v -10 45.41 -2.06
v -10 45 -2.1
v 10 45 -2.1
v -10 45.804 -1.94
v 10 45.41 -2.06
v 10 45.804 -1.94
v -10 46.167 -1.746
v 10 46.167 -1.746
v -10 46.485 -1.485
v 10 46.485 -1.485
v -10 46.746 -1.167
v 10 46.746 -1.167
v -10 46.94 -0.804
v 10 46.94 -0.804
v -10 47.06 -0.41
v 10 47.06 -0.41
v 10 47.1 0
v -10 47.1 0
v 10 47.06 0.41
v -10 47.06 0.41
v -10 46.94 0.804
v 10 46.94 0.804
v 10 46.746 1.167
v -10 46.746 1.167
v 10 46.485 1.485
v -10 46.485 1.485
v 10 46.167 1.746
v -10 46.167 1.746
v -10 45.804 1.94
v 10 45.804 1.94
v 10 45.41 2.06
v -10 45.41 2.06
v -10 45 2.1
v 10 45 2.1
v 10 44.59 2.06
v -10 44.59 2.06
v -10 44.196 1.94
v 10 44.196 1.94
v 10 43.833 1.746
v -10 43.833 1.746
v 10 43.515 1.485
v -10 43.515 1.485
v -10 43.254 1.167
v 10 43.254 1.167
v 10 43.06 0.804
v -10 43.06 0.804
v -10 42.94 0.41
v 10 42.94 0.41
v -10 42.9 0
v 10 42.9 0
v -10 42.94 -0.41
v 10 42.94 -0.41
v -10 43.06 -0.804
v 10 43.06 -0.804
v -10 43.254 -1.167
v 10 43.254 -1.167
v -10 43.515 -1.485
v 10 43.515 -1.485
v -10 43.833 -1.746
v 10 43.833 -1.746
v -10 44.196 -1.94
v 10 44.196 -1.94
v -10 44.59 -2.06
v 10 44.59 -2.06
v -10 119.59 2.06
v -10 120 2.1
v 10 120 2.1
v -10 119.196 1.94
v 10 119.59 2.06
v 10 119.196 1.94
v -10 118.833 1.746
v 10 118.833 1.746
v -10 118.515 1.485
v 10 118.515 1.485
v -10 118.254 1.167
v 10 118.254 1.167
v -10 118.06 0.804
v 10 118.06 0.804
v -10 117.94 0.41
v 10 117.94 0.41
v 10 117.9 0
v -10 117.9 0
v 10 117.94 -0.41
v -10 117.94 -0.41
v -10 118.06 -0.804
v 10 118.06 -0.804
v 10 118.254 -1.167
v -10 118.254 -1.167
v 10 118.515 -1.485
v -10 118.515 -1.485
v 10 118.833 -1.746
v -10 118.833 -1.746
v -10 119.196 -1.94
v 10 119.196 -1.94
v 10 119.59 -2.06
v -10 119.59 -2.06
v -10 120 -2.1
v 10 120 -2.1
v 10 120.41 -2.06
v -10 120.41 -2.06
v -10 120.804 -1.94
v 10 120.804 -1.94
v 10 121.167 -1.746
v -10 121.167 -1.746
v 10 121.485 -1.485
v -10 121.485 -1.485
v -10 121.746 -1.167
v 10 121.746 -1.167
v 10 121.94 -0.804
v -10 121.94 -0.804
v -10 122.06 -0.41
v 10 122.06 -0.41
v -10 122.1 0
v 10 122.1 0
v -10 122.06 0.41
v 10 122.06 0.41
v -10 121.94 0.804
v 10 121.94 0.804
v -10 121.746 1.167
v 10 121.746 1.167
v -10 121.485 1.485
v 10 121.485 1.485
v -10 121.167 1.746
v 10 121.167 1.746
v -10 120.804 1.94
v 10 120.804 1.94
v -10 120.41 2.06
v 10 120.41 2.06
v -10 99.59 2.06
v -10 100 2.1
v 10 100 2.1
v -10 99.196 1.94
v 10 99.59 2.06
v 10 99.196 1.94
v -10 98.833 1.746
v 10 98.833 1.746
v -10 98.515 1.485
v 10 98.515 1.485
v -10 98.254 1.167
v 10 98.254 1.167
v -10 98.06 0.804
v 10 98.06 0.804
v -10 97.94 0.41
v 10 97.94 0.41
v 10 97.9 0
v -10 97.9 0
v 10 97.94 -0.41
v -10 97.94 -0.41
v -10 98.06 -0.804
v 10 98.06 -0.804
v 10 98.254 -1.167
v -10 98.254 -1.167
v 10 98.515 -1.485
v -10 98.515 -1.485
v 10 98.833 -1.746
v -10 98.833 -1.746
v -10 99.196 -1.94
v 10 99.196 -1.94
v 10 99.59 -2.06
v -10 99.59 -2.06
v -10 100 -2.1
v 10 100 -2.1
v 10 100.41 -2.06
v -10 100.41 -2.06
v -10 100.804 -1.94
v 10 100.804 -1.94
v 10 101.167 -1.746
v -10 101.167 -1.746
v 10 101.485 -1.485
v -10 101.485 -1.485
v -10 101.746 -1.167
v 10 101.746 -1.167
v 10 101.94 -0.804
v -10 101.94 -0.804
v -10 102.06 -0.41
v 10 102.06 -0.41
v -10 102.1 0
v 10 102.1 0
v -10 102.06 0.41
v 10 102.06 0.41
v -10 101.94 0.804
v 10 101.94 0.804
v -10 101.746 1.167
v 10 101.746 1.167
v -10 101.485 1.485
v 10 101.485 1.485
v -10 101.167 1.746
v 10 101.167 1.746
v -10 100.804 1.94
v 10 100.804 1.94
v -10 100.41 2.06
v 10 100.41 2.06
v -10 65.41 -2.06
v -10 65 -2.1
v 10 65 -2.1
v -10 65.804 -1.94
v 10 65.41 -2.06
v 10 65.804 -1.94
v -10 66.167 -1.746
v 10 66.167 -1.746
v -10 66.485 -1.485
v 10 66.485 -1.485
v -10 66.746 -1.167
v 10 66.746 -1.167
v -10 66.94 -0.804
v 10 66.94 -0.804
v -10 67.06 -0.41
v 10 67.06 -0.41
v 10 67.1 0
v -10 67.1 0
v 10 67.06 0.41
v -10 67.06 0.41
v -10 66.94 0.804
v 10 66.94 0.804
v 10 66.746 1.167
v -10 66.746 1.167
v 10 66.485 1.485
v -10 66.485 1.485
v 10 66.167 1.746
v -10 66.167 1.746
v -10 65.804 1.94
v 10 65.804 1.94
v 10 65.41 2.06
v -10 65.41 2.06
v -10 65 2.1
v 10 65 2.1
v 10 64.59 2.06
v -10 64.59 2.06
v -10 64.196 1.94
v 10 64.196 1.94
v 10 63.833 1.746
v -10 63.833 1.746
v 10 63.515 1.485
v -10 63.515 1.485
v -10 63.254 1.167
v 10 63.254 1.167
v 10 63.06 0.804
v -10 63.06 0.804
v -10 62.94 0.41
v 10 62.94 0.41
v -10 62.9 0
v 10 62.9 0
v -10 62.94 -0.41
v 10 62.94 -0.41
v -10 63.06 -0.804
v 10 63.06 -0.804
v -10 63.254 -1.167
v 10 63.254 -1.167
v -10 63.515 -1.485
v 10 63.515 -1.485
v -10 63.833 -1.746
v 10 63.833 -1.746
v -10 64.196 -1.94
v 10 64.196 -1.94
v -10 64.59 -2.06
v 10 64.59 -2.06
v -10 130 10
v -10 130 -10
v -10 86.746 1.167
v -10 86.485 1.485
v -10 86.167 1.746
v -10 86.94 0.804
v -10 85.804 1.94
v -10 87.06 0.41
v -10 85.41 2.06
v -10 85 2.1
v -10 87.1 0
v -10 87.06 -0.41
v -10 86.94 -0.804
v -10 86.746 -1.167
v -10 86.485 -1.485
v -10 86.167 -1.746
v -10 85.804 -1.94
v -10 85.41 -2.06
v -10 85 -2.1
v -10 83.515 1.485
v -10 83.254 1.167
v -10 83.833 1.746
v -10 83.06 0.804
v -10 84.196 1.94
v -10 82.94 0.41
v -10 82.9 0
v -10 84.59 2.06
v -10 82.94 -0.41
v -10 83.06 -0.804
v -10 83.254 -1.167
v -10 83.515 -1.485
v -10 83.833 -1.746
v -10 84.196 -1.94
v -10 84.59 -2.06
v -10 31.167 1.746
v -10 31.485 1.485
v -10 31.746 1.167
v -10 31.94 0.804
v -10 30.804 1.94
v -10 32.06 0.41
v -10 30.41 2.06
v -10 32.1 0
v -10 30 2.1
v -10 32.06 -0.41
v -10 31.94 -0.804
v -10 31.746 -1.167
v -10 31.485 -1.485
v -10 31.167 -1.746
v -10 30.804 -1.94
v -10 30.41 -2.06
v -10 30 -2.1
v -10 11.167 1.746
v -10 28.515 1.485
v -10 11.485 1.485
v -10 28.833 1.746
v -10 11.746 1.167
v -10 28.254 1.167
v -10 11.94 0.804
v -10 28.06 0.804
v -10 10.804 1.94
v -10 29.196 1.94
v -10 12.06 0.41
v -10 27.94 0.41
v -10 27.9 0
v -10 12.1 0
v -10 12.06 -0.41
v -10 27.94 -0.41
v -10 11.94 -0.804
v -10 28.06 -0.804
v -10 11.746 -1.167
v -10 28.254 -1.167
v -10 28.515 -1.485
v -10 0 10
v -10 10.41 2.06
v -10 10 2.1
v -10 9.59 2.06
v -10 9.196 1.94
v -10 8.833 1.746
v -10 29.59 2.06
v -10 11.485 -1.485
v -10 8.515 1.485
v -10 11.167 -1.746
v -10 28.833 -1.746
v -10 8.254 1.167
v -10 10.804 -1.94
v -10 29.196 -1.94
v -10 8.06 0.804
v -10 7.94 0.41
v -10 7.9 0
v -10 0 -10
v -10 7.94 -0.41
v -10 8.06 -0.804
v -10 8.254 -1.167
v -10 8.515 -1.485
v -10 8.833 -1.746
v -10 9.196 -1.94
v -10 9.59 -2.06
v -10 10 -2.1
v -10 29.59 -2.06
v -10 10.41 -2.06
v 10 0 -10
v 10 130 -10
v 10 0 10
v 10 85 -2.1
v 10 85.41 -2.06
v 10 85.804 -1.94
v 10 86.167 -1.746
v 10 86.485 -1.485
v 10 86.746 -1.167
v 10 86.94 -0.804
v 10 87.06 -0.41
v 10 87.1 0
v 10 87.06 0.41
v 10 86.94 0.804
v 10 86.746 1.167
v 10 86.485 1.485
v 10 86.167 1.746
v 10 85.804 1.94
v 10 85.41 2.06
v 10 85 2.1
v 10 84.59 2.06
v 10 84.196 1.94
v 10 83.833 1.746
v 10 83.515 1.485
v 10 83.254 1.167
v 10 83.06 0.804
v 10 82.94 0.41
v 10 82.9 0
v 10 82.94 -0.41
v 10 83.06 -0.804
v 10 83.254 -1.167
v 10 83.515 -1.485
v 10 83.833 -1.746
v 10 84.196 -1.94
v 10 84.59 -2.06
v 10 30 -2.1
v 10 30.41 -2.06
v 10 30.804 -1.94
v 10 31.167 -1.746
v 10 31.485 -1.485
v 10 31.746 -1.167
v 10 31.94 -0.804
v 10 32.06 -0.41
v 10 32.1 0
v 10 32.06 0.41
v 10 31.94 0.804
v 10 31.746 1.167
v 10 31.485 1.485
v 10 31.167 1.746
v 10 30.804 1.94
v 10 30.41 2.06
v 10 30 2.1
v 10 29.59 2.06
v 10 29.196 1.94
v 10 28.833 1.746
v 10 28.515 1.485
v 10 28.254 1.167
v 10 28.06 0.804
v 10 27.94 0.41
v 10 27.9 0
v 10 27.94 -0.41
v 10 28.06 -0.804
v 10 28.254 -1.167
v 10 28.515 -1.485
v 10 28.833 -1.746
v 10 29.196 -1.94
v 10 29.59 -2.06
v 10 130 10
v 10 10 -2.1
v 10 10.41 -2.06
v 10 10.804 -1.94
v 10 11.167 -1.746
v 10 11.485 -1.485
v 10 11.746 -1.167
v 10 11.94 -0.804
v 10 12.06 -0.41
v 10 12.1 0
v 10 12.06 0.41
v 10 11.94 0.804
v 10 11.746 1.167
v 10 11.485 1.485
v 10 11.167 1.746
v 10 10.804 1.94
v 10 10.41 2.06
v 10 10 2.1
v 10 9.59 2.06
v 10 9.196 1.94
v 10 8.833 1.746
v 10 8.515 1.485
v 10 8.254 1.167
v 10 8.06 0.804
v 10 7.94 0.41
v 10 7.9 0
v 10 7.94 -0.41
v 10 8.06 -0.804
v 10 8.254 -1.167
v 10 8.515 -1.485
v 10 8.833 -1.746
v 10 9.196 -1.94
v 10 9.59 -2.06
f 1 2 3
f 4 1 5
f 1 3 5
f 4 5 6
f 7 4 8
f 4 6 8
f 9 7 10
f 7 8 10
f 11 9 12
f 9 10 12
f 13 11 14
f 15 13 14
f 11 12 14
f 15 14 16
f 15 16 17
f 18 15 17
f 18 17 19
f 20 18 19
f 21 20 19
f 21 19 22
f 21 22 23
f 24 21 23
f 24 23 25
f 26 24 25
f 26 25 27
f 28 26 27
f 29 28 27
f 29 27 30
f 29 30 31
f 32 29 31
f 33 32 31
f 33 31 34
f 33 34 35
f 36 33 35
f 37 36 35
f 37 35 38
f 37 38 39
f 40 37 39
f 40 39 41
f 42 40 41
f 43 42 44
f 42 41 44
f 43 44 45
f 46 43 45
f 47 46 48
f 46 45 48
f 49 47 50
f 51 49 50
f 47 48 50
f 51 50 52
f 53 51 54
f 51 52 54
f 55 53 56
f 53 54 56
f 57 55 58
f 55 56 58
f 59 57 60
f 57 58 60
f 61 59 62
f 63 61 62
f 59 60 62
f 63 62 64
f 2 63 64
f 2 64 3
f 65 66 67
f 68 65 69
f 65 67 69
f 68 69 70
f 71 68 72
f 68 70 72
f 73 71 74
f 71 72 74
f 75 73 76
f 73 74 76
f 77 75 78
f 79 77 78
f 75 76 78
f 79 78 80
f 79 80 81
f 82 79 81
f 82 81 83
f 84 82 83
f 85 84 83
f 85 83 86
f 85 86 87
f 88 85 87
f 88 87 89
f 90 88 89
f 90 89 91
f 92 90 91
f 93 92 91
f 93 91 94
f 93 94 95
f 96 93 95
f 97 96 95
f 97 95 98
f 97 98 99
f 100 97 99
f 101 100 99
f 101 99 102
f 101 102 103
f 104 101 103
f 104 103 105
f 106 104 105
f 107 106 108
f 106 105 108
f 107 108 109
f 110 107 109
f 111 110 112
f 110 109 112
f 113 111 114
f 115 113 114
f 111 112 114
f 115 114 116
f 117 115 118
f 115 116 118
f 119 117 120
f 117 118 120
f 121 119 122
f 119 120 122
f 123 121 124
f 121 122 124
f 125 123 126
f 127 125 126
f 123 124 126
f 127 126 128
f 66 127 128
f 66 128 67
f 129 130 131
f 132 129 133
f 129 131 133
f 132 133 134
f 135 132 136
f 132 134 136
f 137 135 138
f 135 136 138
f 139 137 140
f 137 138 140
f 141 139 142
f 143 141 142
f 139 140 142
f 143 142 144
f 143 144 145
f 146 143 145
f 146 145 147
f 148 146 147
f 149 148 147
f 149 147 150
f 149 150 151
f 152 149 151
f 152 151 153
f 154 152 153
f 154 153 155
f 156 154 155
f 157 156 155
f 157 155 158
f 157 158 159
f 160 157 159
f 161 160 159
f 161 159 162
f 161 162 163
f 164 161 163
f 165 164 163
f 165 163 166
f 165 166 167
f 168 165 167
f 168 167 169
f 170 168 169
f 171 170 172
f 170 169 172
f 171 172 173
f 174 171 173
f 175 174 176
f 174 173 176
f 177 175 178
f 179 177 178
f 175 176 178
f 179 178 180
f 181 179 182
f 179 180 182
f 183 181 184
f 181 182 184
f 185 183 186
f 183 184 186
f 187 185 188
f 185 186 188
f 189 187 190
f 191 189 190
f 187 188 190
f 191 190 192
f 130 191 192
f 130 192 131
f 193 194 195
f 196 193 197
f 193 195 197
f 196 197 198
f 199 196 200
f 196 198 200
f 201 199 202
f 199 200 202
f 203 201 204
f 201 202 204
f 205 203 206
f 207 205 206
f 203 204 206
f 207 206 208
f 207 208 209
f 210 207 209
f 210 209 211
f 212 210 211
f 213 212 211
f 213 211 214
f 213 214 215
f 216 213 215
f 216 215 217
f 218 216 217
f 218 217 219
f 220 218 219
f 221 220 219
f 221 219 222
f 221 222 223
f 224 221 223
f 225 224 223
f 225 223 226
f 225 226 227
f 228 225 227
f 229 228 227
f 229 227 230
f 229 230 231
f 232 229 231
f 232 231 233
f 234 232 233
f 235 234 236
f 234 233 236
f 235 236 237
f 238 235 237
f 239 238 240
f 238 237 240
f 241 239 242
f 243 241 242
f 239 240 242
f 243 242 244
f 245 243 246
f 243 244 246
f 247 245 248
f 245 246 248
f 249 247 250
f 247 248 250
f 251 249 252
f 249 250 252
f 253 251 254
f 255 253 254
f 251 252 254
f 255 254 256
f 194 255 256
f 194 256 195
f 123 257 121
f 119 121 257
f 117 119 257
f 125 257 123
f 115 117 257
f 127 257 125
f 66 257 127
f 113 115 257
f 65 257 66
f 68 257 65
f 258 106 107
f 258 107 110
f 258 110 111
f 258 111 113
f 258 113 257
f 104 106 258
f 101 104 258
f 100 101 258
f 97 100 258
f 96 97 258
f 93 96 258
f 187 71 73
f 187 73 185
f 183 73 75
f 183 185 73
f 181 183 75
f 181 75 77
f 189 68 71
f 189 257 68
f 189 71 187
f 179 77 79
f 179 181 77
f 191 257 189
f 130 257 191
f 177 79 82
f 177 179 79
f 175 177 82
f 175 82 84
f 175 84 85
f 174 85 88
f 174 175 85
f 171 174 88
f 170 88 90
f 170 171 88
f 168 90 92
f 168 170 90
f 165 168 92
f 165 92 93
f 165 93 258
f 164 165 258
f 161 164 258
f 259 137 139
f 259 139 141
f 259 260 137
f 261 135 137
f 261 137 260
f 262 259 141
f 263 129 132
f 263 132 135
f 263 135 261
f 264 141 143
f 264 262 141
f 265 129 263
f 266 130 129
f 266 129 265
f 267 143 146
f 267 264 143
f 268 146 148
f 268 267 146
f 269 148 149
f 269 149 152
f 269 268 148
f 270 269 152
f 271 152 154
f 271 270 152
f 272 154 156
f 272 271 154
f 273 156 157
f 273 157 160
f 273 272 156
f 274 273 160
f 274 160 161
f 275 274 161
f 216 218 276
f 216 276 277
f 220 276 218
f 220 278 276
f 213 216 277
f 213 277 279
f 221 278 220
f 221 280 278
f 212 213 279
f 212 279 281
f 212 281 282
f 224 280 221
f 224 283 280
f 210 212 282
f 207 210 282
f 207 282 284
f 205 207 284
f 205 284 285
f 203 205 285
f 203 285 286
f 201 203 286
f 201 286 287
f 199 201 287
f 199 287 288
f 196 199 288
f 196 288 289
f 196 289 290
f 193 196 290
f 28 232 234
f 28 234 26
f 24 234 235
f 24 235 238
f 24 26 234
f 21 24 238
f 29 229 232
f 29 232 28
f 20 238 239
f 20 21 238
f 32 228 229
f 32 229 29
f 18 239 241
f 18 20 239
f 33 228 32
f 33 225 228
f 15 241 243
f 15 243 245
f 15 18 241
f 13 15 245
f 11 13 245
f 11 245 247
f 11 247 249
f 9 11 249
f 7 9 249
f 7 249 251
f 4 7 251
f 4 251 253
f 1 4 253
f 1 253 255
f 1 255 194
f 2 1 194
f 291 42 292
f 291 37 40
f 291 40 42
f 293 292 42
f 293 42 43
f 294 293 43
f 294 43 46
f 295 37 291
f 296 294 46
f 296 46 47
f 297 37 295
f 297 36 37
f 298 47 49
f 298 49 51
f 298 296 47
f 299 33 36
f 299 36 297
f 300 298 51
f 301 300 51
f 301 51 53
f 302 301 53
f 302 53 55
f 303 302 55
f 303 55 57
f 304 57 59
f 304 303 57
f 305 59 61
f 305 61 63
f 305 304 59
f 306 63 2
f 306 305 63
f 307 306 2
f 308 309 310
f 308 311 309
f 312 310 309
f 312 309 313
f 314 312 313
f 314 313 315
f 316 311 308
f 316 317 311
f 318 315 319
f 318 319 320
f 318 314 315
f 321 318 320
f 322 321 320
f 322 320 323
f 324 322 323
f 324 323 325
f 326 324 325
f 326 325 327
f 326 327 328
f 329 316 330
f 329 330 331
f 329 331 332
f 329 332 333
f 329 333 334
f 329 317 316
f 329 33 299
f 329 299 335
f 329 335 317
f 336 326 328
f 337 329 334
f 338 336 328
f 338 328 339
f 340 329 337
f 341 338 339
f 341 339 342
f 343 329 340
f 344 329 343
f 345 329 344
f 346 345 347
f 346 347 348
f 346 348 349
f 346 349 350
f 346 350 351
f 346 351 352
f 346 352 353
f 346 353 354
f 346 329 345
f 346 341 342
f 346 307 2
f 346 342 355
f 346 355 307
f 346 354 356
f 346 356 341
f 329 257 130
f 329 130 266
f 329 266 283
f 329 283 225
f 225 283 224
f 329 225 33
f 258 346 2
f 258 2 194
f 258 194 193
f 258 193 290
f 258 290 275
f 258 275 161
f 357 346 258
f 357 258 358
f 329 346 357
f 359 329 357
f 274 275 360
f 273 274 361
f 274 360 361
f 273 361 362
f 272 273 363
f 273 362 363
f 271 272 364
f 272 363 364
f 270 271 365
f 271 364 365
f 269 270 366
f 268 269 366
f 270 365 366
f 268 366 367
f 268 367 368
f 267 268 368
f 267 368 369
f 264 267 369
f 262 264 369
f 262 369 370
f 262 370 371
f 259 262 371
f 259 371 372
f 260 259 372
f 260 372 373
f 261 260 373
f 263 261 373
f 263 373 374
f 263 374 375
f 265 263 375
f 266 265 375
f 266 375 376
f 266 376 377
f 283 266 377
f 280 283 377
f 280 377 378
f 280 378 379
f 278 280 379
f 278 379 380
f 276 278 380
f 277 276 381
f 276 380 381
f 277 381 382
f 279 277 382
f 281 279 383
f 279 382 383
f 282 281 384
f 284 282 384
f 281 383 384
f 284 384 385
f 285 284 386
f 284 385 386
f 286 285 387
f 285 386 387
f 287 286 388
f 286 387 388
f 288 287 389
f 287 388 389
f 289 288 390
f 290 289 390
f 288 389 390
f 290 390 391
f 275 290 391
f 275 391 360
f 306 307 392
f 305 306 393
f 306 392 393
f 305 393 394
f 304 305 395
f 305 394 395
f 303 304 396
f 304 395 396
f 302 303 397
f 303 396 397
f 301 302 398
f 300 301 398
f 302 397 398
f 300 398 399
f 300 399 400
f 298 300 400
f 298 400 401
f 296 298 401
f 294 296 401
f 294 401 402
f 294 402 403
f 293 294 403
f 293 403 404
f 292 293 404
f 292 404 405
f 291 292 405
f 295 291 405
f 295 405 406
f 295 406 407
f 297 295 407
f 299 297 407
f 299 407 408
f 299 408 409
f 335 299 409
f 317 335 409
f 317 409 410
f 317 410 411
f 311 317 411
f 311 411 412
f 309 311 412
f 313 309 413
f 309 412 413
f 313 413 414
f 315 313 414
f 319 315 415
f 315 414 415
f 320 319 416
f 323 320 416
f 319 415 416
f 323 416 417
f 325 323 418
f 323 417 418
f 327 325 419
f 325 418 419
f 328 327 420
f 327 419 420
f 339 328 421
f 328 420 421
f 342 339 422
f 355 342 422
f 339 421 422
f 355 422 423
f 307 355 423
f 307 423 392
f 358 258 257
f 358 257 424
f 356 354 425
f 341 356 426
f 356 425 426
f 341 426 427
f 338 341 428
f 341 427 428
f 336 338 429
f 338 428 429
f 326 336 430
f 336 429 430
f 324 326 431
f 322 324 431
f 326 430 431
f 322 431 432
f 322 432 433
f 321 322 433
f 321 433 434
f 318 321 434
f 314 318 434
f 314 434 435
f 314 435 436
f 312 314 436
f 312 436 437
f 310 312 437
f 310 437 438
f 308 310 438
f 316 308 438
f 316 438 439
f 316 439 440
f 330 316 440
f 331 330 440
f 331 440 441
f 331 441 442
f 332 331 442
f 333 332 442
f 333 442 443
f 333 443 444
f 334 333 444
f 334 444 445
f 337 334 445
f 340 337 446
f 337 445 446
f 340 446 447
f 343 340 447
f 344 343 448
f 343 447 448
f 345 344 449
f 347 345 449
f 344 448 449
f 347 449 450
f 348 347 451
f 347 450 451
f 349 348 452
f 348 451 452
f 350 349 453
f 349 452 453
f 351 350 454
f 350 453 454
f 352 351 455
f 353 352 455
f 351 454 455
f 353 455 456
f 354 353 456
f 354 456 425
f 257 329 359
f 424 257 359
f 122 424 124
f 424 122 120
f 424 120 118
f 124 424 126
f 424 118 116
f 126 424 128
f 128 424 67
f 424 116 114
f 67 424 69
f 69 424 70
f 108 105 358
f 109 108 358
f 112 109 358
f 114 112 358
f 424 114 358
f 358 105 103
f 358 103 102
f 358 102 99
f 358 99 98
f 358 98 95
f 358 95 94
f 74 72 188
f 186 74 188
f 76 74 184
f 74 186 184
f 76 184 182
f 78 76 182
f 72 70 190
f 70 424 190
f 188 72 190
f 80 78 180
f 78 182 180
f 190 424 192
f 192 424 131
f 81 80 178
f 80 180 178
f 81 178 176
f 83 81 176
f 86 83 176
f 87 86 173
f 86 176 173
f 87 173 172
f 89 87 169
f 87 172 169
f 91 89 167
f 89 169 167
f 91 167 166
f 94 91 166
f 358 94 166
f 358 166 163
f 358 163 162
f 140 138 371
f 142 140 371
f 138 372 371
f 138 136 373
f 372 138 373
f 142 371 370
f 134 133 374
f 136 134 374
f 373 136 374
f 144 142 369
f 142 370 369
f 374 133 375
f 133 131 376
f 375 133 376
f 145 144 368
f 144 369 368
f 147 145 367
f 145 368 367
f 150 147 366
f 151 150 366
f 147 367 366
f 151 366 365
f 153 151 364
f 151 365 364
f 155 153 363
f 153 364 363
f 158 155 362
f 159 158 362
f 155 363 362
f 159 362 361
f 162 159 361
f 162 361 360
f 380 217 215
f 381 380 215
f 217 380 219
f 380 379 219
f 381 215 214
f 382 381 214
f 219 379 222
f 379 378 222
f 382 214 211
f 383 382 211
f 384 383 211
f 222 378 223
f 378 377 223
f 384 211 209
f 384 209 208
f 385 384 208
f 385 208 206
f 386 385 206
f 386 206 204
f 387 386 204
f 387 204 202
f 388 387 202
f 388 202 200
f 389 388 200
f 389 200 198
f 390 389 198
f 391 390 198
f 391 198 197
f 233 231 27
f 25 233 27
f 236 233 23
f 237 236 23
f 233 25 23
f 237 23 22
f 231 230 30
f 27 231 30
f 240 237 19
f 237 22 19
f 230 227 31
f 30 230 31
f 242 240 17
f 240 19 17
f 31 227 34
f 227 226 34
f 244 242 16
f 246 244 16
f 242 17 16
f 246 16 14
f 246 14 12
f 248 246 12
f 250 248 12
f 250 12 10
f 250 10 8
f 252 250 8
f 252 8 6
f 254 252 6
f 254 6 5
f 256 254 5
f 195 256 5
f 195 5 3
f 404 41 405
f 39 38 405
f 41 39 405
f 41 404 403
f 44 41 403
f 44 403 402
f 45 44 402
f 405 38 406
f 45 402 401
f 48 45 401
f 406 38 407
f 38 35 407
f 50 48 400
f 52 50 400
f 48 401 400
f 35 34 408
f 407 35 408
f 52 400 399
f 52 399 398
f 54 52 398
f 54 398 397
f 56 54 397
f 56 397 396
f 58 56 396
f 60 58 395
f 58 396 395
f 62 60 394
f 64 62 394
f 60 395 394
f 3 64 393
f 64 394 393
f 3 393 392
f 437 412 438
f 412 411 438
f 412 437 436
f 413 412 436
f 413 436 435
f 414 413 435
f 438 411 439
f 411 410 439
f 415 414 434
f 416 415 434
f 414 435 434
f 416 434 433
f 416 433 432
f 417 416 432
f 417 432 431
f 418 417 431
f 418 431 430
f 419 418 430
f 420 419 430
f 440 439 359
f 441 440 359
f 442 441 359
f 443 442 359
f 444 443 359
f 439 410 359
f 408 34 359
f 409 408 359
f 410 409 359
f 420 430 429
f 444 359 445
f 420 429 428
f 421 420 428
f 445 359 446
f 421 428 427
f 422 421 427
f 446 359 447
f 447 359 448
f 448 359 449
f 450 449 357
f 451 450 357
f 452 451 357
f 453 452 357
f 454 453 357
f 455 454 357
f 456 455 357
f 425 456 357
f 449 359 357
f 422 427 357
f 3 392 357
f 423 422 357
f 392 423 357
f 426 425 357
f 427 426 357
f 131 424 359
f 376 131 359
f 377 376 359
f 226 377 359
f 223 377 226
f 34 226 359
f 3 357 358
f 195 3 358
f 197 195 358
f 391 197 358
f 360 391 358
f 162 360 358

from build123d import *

# Parameters (mm, degrees)
SKETCH_1_W          = 20
SKETCH_1_H          = 20
EXTRUDE_1_DEPTH     = 130
SKETCH_2_R          = 2.1
CUT_EXTRUDE_1_DEPTH = 132.909059583


with BuildPart() as part:
    # 草图1 → 凸台-拉伸1 (new body)
    with BuildSketch(Plane(origin=(0, 0, 0), x_dir=(1, 0, 0), z_dir=(0, 1, 0))):
        Rectangle(SKETCH_1_W, SKETCH_1_H)
    extrude(amount=EXTRUDE_1_DEPTH)

    # 草图2 → 切除-拉伸1 (cut, through all)
    with BuildSketch(Plane(origin=(10, 0, 0), x_dir=(0, 0, -1), z_dir=(1, 0, 0))):
        with Locations((0, 45)):
            Circle(SKETCH_2_R)
        with Locations((0, 65)):
            Circle(SKETCH_2_R)
        with Locations((0, 85)):
            Circle(SKETCH_2_R)
        with Locations((0, 10)):
            Circle(SKETCH_2_R)
        with Locations((0, 30)):
            Circle(SKETCH_2_R)
        with Locations(Location((0, 100, 0), (0, 0, 180))):
            Circle(SKETCH_2_R)
        with Locations(Location((0, 120, 0), (0, 0, 180))):
            Circle(SKETCH_2_R)
    extrude(amount=-CUT_EXTRUDE_1_DEPTH, mode=Mode.SUBTRACT)


solid = part.part
